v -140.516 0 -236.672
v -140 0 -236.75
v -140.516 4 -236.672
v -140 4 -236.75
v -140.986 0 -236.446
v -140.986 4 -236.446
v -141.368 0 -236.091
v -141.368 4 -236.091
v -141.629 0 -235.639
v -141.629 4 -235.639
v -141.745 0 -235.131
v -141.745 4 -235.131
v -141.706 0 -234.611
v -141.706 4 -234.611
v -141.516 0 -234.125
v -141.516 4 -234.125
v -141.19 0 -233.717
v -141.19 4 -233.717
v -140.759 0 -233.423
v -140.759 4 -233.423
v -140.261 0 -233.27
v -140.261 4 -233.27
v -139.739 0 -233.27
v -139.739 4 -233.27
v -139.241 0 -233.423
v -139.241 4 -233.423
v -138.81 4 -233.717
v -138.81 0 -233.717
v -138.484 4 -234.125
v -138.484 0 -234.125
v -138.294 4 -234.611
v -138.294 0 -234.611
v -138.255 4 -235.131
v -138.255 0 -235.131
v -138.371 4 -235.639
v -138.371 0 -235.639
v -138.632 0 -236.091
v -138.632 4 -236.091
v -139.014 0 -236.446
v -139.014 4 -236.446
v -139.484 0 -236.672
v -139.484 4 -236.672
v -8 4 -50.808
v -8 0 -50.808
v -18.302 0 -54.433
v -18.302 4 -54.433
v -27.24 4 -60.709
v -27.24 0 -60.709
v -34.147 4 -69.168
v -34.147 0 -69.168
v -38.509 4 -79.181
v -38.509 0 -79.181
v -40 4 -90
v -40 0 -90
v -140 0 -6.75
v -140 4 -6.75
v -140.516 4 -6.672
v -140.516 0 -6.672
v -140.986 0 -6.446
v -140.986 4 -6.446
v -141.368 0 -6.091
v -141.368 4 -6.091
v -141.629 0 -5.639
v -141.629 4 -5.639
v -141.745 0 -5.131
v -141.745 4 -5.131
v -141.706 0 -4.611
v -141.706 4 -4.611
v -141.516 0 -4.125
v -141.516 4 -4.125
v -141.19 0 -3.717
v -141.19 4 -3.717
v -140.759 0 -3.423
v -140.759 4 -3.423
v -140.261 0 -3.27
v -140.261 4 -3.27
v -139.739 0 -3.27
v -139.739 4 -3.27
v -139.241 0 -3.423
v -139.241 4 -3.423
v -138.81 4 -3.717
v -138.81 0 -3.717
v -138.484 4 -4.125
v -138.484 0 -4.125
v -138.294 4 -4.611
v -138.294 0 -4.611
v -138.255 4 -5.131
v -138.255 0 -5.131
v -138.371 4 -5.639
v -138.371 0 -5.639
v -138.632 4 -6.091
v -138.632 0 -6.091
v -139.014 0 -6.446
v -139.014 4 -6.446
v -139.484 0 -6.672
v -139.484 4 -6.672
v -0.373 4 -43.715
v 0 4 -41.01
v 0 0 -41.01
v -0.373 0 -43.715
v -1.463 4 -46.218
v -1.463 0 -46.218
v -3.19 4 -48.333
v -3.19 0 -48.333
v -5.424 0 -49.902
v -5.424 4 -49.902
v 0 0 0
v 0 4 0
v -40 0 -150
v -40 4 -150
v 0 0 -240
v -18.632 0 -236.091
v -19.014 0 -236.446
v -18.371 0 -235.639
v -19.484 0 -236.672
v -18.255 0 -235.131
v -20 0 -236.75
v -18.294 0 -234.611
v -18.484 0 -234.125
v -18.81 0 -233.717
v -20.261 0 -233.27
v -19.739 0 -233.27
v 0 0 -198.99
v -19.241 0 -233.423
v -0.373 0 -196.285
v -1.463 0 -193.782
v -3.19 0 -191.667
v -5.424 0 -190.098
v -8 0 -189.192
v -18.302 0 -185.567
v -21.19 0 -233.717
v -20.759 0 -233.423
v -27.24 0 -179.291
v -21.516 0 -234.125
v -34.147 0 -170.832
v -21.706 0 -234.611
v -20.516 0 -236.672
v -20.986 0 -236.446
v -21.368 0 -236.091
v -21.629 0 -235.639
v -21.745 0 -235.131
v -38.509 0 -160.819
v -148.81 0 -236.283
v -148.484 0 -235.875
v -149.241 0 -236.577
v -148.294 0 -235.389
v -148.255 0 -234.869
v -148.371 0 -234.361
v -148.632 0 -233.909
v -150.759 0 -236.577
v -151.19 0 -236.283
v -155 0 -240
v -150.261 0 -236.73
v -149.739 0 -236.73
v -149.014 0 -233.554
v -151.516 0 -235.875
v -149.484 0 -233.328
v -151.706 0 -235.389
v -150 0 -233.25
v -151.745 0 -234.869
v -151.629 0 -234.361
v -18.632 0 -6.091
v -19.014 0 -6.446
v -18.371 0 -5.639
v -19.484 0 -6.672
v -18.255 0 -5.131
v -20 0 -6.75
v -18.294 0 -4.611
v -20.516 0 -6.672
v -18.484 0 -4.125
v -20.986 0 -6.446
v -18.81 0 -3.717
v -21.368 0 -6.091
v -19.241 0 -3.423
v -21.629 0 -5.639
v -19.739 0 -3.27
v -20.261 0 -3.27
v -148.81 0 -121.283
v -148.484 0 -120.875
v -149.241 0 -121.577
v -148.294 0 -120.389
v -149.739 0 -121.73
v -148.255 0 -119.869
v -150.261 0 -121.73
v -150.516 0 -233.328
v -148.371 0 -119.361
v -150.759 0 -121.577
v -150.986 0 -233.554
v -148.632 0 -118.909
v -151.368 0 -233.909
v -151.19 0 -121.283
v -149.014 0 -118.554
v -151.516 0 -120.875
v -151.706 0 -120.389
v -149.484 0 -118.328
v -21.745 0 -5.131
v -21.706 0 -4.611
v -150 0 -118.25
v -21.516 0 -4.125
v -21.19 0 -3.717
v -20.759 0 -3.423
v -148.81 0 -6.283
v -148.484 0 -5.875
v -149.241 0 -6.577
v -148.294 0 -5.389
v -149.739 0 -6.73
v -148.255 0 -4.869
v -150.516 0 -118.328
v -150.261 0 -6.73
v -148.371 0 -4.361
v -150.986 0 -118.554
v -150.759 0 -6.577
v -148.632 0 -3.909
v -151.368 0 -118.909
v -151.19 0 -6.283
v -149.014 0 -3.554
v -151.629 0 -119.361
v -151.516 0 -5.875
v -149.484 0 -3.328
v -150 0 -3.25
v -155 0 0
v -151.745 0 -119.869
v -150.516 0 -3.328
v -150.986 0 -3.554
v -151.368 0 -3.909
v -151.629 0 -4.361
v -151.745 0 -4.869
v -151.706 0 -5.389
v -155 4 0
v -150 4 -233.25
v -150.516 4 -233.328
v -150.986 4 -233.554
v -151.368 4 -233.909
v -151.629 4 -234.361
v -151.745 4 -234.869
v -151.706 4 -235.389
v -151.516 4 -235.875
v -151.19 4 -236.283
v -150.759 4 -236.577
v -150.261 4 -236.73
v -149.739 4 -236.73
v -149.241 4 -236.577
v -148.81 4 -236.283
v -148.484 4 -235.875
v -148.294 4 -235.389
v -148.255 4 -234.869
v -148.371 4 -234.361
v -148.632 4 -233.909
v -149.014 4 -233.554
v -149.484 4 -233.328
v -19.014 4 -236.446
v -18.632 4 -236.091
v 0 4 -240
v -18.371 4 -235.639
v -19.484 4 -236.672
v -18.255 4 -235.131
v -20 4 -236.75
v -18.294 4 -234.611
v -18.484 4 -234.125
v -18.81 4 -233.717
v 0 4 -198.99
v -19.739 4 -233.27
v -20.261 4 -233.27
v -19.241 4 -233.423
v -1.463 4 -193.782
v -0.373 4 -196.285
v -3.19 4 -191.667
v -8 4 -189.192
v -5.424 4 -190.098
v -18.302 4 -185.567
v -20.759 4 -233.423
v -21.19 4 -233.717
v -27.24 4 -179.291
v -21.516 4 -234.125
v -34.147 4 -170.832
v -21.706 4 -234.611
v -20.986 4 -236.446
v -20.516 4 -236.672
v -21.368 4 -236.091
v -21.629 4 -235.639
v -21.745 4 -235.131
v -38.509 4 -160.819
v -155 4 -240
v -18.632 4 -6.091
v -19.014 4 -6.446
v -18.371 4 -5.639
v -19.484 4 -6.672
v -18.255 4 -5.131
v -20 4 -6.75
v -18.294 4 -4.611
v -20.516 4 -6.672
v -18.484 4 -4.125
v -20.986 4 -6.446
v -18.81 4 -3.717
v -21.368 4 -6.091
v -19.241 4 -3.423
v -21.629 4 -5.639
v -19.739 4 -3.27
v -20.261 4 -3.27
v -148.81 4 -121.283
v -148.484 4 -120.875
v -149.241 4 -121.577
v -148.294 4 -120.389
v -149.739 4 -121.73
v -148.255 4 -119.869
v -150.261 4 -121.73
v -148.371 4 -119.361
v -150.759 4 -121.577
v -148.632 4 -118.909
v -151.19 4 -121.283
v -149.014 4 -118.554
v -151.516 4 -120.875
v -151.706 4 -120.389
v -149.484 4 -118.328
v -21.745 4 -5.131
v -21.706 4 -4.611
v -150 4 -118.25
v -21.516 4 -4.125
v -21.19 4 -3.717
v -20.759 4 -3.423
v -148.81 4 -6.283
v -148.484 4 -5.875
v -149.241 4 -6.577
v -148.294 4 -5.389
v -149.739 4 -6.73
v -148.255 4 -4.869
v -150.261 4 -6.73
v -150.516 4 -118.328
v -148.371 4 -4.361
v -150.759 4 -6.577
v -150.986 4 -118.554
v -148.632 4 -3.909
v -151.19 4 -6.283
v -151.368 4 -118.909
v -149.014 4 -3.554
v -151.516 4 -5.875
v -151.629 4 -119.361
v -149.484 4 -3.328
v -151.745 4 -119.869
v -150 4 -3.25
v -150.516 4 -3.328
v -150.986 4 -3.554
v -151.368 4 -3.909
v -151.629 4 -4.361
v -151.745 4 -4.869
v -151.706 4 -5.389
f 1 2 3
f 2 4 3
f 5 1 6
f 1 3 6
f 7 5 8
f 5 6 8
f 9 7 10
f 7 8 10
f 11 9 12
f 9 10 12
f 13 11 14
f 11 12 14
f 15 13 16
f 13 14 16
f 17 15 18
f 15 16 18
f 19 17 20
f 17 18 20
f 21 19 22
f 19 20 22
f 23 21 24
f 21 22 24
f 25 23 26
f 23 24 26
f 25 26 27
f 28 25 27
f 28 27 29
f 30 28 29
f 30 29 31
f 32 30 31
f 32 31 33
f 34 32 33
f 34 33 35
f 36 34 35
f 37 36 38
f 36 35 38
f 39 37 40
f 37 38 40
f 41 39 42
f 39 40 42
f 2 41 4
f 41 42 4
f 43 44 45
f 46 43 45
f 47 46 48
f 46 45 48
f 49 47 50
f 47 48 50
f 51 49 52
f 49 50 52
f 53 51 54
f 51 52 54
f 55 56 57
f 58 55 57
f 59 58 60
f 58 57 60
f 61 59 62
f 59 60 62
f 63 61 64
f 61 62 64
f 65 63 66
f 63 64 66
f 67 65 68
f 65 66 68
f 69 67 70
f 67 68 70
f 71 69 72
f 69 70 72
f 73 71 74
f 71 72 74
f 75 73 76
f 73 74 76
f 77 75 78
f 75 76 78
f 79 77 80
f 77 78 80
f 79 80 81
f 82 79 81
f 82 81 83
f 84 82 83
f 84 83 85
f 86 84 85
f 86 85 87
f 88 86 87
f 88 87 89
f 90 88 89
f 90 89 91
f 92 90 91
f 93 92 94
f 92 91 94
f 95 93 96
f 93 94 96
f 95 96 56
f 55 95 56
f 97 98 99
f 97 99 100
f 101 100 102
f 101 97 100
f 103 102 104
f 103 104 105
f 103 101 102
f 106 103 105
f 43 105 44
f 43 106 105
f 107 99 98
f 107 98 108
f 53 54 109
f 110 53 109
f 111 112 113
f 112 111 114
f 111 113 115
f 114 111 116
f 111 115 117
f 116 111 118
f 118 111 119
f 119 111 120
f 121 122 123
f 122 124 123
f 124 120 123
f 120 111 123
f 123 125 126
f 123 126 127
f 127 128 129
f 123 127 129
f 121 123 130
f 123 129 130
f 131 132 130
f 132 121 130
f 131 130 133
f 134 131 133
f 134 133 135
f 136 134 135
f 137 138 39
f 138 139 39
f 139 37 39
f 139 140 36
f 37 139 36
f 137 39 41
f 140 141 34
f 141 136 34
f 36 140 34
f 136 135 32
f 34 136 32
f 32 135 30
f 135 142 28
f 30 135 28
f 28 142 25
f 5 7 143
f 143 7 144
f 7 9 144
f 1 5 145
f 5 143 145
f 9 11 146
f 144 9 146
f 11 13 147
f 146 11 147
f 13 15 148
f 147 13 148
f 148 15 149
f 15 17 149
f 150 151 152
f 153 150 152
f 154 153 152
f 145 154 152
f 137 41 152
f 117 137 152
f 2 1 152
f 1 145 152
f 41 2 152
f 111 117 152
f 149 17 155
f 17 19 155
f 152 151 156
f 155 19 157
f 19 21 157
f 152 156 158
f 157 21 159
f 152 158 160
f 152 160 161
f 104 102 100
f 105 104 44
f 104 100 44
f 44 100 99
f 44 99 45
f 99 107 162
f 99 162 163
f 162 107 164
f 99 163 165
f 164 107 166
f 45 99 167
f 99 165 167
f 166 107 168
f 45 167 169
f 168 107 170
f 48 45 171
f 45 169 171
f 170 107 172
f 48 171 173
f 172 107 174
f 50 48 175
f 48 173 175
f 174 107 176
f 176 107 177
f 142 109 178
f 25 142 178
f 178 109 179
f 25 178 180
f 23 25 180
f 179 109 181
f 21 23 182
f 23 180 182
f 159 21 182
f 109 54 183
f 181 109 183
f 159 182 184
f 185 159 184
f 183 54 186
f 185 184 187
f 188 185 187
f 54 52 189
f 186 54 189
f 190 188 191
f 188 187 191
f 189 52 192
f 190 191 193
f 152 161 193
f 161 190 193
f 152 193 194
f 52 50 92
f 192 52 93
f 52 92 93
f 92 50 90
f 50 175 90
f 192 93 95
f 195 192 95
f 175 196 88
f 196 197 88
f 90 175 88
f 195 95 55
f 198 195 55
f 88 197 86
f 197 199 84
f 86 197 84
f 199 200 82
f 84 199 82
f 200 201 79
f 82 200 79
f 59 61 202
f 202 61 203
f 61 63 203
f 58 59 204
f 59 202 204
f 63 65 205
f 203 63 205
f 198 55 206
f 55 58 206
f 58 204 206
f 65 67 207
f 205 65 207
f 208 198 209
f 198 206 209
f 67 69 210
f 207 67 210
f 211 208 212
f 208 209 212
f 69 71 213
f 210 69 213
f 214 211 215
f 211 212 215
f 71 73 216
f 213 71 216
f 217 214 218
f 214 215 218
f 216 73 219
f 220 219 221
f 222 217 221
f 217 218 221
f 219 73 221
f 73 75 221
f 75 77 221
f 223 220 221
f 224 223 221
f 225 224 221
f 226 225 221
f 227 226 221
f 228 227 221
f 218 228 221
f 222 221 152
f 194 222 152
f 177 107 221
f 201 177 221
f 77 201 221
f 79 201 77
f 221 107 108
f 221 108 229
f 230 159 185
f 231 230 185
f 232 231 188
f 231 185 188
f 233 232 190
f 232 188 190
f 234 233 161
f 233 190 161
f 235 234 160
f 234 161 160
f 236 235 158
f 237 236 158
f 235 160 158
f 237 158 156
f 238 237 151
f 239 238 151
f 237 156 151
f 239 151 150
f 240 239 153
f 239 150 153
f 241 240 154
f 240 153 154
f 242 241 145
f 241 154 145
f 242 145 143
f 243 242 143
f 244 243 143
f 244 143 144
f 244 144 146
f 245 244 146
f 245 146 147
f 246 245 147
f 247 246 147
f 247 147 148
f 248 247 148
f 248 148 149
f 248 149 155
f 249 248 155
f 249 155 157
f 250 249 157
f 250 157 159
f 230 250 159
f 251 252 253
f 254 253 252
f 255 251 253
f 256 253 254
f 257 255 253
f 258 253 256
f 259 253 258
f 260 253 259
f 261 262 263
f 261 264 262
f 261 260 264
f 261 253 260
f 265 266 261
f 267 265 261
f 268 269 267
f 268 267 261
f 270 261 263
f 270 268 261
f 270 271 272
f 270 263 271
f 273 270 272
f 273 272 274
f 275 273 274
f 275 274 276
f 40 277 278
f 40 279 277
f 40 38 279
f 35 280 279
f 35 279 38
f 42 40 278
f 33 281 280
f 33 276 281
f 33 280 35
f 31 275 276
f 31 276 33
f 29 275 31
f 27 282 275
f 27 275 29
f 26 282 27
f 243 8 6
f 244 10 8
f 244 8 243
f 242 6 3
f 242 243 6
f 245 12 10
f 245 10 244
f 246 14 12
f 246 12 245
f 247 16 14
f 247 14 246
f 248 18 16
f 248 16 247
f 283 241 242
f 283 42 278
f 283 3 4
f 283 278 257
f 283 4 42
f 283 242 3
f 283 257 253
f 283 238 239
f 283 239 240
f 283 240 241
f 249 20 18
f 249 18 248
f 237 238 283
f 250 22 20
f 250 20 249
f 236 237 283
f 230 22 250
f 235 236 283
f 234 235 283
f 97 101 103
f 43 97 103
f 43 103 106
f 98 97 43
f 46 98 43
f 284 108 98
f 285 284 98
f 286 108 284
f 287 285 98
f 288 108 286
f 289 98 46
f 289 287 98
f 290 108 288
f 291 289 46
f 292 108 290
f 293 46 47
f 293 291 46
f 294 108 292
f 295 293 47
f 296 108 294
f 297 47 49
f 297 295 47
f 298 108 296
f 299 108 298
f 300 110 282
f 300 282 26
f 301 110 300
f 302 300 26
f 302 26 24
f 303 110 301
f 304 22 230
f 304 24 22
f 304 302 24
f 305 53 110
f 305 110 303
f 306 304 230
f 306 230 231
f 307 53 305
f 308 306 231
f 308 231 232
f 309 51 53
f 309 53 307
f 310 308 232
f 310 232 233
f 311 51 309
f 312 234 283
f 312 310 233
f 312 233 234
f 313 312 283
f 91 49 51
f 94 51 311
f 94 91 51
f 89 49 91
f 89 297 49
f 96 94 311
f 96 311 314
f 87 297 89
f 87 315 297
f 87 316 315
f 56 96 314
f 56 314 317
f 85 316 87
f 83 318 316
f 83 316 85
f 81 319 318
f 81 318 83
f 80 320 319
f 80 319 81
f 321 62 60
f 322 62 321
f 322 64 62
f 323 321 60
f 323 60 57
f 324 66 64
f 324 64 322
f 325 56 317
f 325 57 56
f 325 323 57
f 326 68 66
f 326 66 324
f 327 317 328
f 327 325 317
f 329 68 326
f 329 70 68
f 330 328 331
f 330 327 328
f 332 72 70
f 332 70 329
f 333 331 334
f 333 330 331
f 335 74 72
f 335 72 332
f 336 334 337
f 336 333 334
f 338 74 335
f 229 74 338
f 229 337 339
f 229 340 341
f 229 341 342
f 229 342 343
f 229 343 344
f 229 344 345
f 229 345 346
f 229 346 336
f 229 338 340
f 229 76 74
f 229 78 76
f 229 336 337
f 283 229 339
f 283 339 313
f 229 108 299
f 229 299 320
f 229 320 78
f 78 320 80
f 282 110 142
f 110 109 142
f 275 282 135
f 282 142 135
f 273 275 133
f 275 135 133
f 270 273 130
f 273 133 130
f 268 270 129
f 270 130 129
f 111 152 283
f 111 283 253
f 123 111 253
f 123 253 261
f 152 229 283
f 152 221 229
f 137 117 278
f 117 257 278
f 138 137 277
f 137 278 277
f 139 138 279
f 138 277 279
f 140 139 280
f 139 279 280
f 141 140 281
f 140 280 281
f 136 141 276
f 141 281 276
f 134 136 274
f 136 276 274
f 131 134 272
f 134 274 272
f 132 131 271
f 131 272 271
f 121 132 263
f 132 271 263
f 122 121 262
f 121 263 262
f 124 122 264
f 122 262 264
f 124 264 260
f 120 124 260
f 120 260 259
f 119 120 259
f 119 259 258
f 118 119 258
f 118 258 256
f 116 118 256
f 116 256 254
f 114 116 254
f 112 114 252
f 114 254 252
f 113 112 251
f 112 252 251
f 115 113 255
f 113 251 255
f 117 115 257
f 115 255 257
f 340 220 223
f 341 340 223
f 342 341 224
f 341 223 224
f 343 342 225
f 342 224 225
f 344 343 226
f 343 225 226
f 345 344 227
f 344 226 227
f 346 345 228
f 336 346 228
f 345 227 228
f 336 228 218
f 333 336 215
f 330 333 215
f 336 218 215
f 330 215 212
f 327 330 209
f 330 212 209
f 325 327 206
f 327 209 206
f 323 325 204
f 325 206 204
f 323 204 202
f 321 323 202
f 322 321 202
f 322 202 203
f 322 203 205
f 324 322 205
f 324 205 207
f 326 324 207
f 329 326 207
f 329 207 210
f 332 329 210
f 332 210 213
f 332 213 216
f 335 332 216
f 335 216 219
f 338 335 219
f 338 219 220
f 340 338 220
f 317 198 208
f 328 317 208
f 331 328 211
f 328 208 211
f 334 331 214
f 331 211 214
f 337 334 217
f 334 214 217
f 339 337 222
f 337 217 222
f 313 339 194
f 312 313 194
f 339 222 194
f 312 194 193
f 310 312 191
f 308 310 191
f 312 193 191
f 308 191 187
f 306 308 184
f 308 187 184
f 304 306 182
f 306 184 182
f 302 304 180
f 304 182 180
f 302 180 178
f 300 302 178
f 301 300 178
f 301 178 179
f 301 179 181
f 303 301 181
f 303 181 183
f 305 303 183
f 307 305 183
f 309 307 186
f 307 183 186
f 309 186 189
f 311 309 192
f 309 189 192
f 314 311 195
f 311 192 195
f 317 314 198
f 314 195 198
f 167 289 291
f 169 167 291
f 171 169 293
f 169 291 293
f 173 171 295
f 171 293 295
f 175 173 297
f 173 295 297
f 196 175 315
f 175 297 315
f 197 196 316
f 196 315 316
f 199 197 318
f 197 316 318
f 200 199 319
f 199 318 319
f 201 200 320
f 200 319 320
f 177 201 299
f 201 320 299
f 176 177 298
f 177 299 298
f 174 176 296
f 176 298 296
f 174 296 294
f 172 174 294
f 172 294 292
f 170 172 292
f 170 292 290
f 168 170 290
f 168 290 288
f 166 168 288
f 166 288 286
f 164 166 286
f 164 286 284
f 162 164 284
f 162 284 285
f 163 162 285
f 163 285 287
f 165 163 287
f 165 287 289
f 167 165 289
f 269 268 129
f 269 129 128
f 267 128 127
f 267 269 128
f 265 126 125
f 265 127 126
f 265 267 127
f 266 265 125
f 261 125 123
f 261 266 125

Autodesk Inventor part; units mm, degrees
ref_plane "YZ Plane" through (0, 0, 0) normal (1, 0, 0) x (0, 1, 0)
ref_plane "XZ Plane" through (0, 0, 0) normal (0, 1, 0) x (-1, 0, 0)
ref_plane "XY Plane" through (0, 0, 0) normal (0, 0, 1) x (1, 0, 0)
sketch "スケッチ1" plane through (0, 0, 0) normal (0, 1, 0) x (-1, 0, 0)
  line L0 (0, 0) -> (155, 0)
  line L1 (155, 0) -> (155, -240)
  line L2 (155, -240) -> (0, -240)
  line L3 (0, -240) -> (0, 0)
  dimension "d0" = 155
  dimension "d1" = 240
extrude "押し出し1" add sketch "スケッチ1" along normal blind 4
sketch "スケッチ3" plane through (0, 4, 0) normal (0, 1, 0) x (1, 0, 0)
  line L0 (-155, 240) -> (-155, 0) projected
  line L1 (-155, 0) -> (0, 0) projected
  line L2 (0, 240) -> (-155, 240) projected
  point P0 (-150, 5)
  point P1 (-150, 235)
  point P2 (-150, 120)
  point P3 (-155, 120)
  dimension "d11" = 5
  dimension "d12" = 5
  dimension "d13" = 5
  dimension "d14" = 5
  dimension "d15" = 5
  dimension "d16" = 0
hole "穴1" at (-150, 4, -5) at (-150, 4, -235) at (-150, 4, -120) direction (0, -1, 0) diameter 3.5 end through all
sketch "スケッチ5" plane through (0, 0, 0) normal (0, -1, 0) x (1, 0, 0)
  line L0 (0, -90) -> (0, -150) construction
  line L1 (0, 0) -> (0, -240) projected
  line L2 (-40, -90) -> (-40, -150)
  line L3 (40, -150) -> (40, -90)
  arc A0 (40, -90) -> (-40, -90) centre (0, -90) ccw
  arc A1 (-40, -150) -> (40, -150) centre (0, -150) ccw
  point P0 (0, -120)
  point P1 (0, -190)
  point P2 (0, -50)
  dimension "d17" = 80
  dimension "d18" = 30
extrude "押し出し2" cut sketch "スケッチ5" against normal blind 10 contours L1 A1 L2 A0
sketch "スケッチ6" plane through (0, 0, 0) normal (0, -1, 0) x (1, 0, 0)
  line L0 (0, -240) -> (-155, -240) projected
  line L1 (0, -190) -> (0, -240) projected
  line L2 (-155, 0) -> (0, 0) projected
  line L3 (0, 0) -> (0, -50) projected
  point P0 (-20, -235)
  point P1 (-140, -235)
  point P2 (-140, -5)
  point P3 (-20, -5)
  dimension "d28" = 120
  dimension "d30" = 20
  dimension "d31" = 5
  dimension "d32" = 5
  dimension "d33" = 120
  dimension "d34" = 5
  dimension "d35" = 20
  dimension "d36" = 5
hole "穴2" at (-20, 0, -235) at (-140, 0, -235) at (-140, 0, -5) at (-20, 0, -5) direction (0, 1, 0) diameter 3.5 end through all
fillet "フィレット1" radius 10 2 edges at (0, 2, -50) (0, 2, -190)
properties part number "slide_panel" material "木材(サクラ)"
